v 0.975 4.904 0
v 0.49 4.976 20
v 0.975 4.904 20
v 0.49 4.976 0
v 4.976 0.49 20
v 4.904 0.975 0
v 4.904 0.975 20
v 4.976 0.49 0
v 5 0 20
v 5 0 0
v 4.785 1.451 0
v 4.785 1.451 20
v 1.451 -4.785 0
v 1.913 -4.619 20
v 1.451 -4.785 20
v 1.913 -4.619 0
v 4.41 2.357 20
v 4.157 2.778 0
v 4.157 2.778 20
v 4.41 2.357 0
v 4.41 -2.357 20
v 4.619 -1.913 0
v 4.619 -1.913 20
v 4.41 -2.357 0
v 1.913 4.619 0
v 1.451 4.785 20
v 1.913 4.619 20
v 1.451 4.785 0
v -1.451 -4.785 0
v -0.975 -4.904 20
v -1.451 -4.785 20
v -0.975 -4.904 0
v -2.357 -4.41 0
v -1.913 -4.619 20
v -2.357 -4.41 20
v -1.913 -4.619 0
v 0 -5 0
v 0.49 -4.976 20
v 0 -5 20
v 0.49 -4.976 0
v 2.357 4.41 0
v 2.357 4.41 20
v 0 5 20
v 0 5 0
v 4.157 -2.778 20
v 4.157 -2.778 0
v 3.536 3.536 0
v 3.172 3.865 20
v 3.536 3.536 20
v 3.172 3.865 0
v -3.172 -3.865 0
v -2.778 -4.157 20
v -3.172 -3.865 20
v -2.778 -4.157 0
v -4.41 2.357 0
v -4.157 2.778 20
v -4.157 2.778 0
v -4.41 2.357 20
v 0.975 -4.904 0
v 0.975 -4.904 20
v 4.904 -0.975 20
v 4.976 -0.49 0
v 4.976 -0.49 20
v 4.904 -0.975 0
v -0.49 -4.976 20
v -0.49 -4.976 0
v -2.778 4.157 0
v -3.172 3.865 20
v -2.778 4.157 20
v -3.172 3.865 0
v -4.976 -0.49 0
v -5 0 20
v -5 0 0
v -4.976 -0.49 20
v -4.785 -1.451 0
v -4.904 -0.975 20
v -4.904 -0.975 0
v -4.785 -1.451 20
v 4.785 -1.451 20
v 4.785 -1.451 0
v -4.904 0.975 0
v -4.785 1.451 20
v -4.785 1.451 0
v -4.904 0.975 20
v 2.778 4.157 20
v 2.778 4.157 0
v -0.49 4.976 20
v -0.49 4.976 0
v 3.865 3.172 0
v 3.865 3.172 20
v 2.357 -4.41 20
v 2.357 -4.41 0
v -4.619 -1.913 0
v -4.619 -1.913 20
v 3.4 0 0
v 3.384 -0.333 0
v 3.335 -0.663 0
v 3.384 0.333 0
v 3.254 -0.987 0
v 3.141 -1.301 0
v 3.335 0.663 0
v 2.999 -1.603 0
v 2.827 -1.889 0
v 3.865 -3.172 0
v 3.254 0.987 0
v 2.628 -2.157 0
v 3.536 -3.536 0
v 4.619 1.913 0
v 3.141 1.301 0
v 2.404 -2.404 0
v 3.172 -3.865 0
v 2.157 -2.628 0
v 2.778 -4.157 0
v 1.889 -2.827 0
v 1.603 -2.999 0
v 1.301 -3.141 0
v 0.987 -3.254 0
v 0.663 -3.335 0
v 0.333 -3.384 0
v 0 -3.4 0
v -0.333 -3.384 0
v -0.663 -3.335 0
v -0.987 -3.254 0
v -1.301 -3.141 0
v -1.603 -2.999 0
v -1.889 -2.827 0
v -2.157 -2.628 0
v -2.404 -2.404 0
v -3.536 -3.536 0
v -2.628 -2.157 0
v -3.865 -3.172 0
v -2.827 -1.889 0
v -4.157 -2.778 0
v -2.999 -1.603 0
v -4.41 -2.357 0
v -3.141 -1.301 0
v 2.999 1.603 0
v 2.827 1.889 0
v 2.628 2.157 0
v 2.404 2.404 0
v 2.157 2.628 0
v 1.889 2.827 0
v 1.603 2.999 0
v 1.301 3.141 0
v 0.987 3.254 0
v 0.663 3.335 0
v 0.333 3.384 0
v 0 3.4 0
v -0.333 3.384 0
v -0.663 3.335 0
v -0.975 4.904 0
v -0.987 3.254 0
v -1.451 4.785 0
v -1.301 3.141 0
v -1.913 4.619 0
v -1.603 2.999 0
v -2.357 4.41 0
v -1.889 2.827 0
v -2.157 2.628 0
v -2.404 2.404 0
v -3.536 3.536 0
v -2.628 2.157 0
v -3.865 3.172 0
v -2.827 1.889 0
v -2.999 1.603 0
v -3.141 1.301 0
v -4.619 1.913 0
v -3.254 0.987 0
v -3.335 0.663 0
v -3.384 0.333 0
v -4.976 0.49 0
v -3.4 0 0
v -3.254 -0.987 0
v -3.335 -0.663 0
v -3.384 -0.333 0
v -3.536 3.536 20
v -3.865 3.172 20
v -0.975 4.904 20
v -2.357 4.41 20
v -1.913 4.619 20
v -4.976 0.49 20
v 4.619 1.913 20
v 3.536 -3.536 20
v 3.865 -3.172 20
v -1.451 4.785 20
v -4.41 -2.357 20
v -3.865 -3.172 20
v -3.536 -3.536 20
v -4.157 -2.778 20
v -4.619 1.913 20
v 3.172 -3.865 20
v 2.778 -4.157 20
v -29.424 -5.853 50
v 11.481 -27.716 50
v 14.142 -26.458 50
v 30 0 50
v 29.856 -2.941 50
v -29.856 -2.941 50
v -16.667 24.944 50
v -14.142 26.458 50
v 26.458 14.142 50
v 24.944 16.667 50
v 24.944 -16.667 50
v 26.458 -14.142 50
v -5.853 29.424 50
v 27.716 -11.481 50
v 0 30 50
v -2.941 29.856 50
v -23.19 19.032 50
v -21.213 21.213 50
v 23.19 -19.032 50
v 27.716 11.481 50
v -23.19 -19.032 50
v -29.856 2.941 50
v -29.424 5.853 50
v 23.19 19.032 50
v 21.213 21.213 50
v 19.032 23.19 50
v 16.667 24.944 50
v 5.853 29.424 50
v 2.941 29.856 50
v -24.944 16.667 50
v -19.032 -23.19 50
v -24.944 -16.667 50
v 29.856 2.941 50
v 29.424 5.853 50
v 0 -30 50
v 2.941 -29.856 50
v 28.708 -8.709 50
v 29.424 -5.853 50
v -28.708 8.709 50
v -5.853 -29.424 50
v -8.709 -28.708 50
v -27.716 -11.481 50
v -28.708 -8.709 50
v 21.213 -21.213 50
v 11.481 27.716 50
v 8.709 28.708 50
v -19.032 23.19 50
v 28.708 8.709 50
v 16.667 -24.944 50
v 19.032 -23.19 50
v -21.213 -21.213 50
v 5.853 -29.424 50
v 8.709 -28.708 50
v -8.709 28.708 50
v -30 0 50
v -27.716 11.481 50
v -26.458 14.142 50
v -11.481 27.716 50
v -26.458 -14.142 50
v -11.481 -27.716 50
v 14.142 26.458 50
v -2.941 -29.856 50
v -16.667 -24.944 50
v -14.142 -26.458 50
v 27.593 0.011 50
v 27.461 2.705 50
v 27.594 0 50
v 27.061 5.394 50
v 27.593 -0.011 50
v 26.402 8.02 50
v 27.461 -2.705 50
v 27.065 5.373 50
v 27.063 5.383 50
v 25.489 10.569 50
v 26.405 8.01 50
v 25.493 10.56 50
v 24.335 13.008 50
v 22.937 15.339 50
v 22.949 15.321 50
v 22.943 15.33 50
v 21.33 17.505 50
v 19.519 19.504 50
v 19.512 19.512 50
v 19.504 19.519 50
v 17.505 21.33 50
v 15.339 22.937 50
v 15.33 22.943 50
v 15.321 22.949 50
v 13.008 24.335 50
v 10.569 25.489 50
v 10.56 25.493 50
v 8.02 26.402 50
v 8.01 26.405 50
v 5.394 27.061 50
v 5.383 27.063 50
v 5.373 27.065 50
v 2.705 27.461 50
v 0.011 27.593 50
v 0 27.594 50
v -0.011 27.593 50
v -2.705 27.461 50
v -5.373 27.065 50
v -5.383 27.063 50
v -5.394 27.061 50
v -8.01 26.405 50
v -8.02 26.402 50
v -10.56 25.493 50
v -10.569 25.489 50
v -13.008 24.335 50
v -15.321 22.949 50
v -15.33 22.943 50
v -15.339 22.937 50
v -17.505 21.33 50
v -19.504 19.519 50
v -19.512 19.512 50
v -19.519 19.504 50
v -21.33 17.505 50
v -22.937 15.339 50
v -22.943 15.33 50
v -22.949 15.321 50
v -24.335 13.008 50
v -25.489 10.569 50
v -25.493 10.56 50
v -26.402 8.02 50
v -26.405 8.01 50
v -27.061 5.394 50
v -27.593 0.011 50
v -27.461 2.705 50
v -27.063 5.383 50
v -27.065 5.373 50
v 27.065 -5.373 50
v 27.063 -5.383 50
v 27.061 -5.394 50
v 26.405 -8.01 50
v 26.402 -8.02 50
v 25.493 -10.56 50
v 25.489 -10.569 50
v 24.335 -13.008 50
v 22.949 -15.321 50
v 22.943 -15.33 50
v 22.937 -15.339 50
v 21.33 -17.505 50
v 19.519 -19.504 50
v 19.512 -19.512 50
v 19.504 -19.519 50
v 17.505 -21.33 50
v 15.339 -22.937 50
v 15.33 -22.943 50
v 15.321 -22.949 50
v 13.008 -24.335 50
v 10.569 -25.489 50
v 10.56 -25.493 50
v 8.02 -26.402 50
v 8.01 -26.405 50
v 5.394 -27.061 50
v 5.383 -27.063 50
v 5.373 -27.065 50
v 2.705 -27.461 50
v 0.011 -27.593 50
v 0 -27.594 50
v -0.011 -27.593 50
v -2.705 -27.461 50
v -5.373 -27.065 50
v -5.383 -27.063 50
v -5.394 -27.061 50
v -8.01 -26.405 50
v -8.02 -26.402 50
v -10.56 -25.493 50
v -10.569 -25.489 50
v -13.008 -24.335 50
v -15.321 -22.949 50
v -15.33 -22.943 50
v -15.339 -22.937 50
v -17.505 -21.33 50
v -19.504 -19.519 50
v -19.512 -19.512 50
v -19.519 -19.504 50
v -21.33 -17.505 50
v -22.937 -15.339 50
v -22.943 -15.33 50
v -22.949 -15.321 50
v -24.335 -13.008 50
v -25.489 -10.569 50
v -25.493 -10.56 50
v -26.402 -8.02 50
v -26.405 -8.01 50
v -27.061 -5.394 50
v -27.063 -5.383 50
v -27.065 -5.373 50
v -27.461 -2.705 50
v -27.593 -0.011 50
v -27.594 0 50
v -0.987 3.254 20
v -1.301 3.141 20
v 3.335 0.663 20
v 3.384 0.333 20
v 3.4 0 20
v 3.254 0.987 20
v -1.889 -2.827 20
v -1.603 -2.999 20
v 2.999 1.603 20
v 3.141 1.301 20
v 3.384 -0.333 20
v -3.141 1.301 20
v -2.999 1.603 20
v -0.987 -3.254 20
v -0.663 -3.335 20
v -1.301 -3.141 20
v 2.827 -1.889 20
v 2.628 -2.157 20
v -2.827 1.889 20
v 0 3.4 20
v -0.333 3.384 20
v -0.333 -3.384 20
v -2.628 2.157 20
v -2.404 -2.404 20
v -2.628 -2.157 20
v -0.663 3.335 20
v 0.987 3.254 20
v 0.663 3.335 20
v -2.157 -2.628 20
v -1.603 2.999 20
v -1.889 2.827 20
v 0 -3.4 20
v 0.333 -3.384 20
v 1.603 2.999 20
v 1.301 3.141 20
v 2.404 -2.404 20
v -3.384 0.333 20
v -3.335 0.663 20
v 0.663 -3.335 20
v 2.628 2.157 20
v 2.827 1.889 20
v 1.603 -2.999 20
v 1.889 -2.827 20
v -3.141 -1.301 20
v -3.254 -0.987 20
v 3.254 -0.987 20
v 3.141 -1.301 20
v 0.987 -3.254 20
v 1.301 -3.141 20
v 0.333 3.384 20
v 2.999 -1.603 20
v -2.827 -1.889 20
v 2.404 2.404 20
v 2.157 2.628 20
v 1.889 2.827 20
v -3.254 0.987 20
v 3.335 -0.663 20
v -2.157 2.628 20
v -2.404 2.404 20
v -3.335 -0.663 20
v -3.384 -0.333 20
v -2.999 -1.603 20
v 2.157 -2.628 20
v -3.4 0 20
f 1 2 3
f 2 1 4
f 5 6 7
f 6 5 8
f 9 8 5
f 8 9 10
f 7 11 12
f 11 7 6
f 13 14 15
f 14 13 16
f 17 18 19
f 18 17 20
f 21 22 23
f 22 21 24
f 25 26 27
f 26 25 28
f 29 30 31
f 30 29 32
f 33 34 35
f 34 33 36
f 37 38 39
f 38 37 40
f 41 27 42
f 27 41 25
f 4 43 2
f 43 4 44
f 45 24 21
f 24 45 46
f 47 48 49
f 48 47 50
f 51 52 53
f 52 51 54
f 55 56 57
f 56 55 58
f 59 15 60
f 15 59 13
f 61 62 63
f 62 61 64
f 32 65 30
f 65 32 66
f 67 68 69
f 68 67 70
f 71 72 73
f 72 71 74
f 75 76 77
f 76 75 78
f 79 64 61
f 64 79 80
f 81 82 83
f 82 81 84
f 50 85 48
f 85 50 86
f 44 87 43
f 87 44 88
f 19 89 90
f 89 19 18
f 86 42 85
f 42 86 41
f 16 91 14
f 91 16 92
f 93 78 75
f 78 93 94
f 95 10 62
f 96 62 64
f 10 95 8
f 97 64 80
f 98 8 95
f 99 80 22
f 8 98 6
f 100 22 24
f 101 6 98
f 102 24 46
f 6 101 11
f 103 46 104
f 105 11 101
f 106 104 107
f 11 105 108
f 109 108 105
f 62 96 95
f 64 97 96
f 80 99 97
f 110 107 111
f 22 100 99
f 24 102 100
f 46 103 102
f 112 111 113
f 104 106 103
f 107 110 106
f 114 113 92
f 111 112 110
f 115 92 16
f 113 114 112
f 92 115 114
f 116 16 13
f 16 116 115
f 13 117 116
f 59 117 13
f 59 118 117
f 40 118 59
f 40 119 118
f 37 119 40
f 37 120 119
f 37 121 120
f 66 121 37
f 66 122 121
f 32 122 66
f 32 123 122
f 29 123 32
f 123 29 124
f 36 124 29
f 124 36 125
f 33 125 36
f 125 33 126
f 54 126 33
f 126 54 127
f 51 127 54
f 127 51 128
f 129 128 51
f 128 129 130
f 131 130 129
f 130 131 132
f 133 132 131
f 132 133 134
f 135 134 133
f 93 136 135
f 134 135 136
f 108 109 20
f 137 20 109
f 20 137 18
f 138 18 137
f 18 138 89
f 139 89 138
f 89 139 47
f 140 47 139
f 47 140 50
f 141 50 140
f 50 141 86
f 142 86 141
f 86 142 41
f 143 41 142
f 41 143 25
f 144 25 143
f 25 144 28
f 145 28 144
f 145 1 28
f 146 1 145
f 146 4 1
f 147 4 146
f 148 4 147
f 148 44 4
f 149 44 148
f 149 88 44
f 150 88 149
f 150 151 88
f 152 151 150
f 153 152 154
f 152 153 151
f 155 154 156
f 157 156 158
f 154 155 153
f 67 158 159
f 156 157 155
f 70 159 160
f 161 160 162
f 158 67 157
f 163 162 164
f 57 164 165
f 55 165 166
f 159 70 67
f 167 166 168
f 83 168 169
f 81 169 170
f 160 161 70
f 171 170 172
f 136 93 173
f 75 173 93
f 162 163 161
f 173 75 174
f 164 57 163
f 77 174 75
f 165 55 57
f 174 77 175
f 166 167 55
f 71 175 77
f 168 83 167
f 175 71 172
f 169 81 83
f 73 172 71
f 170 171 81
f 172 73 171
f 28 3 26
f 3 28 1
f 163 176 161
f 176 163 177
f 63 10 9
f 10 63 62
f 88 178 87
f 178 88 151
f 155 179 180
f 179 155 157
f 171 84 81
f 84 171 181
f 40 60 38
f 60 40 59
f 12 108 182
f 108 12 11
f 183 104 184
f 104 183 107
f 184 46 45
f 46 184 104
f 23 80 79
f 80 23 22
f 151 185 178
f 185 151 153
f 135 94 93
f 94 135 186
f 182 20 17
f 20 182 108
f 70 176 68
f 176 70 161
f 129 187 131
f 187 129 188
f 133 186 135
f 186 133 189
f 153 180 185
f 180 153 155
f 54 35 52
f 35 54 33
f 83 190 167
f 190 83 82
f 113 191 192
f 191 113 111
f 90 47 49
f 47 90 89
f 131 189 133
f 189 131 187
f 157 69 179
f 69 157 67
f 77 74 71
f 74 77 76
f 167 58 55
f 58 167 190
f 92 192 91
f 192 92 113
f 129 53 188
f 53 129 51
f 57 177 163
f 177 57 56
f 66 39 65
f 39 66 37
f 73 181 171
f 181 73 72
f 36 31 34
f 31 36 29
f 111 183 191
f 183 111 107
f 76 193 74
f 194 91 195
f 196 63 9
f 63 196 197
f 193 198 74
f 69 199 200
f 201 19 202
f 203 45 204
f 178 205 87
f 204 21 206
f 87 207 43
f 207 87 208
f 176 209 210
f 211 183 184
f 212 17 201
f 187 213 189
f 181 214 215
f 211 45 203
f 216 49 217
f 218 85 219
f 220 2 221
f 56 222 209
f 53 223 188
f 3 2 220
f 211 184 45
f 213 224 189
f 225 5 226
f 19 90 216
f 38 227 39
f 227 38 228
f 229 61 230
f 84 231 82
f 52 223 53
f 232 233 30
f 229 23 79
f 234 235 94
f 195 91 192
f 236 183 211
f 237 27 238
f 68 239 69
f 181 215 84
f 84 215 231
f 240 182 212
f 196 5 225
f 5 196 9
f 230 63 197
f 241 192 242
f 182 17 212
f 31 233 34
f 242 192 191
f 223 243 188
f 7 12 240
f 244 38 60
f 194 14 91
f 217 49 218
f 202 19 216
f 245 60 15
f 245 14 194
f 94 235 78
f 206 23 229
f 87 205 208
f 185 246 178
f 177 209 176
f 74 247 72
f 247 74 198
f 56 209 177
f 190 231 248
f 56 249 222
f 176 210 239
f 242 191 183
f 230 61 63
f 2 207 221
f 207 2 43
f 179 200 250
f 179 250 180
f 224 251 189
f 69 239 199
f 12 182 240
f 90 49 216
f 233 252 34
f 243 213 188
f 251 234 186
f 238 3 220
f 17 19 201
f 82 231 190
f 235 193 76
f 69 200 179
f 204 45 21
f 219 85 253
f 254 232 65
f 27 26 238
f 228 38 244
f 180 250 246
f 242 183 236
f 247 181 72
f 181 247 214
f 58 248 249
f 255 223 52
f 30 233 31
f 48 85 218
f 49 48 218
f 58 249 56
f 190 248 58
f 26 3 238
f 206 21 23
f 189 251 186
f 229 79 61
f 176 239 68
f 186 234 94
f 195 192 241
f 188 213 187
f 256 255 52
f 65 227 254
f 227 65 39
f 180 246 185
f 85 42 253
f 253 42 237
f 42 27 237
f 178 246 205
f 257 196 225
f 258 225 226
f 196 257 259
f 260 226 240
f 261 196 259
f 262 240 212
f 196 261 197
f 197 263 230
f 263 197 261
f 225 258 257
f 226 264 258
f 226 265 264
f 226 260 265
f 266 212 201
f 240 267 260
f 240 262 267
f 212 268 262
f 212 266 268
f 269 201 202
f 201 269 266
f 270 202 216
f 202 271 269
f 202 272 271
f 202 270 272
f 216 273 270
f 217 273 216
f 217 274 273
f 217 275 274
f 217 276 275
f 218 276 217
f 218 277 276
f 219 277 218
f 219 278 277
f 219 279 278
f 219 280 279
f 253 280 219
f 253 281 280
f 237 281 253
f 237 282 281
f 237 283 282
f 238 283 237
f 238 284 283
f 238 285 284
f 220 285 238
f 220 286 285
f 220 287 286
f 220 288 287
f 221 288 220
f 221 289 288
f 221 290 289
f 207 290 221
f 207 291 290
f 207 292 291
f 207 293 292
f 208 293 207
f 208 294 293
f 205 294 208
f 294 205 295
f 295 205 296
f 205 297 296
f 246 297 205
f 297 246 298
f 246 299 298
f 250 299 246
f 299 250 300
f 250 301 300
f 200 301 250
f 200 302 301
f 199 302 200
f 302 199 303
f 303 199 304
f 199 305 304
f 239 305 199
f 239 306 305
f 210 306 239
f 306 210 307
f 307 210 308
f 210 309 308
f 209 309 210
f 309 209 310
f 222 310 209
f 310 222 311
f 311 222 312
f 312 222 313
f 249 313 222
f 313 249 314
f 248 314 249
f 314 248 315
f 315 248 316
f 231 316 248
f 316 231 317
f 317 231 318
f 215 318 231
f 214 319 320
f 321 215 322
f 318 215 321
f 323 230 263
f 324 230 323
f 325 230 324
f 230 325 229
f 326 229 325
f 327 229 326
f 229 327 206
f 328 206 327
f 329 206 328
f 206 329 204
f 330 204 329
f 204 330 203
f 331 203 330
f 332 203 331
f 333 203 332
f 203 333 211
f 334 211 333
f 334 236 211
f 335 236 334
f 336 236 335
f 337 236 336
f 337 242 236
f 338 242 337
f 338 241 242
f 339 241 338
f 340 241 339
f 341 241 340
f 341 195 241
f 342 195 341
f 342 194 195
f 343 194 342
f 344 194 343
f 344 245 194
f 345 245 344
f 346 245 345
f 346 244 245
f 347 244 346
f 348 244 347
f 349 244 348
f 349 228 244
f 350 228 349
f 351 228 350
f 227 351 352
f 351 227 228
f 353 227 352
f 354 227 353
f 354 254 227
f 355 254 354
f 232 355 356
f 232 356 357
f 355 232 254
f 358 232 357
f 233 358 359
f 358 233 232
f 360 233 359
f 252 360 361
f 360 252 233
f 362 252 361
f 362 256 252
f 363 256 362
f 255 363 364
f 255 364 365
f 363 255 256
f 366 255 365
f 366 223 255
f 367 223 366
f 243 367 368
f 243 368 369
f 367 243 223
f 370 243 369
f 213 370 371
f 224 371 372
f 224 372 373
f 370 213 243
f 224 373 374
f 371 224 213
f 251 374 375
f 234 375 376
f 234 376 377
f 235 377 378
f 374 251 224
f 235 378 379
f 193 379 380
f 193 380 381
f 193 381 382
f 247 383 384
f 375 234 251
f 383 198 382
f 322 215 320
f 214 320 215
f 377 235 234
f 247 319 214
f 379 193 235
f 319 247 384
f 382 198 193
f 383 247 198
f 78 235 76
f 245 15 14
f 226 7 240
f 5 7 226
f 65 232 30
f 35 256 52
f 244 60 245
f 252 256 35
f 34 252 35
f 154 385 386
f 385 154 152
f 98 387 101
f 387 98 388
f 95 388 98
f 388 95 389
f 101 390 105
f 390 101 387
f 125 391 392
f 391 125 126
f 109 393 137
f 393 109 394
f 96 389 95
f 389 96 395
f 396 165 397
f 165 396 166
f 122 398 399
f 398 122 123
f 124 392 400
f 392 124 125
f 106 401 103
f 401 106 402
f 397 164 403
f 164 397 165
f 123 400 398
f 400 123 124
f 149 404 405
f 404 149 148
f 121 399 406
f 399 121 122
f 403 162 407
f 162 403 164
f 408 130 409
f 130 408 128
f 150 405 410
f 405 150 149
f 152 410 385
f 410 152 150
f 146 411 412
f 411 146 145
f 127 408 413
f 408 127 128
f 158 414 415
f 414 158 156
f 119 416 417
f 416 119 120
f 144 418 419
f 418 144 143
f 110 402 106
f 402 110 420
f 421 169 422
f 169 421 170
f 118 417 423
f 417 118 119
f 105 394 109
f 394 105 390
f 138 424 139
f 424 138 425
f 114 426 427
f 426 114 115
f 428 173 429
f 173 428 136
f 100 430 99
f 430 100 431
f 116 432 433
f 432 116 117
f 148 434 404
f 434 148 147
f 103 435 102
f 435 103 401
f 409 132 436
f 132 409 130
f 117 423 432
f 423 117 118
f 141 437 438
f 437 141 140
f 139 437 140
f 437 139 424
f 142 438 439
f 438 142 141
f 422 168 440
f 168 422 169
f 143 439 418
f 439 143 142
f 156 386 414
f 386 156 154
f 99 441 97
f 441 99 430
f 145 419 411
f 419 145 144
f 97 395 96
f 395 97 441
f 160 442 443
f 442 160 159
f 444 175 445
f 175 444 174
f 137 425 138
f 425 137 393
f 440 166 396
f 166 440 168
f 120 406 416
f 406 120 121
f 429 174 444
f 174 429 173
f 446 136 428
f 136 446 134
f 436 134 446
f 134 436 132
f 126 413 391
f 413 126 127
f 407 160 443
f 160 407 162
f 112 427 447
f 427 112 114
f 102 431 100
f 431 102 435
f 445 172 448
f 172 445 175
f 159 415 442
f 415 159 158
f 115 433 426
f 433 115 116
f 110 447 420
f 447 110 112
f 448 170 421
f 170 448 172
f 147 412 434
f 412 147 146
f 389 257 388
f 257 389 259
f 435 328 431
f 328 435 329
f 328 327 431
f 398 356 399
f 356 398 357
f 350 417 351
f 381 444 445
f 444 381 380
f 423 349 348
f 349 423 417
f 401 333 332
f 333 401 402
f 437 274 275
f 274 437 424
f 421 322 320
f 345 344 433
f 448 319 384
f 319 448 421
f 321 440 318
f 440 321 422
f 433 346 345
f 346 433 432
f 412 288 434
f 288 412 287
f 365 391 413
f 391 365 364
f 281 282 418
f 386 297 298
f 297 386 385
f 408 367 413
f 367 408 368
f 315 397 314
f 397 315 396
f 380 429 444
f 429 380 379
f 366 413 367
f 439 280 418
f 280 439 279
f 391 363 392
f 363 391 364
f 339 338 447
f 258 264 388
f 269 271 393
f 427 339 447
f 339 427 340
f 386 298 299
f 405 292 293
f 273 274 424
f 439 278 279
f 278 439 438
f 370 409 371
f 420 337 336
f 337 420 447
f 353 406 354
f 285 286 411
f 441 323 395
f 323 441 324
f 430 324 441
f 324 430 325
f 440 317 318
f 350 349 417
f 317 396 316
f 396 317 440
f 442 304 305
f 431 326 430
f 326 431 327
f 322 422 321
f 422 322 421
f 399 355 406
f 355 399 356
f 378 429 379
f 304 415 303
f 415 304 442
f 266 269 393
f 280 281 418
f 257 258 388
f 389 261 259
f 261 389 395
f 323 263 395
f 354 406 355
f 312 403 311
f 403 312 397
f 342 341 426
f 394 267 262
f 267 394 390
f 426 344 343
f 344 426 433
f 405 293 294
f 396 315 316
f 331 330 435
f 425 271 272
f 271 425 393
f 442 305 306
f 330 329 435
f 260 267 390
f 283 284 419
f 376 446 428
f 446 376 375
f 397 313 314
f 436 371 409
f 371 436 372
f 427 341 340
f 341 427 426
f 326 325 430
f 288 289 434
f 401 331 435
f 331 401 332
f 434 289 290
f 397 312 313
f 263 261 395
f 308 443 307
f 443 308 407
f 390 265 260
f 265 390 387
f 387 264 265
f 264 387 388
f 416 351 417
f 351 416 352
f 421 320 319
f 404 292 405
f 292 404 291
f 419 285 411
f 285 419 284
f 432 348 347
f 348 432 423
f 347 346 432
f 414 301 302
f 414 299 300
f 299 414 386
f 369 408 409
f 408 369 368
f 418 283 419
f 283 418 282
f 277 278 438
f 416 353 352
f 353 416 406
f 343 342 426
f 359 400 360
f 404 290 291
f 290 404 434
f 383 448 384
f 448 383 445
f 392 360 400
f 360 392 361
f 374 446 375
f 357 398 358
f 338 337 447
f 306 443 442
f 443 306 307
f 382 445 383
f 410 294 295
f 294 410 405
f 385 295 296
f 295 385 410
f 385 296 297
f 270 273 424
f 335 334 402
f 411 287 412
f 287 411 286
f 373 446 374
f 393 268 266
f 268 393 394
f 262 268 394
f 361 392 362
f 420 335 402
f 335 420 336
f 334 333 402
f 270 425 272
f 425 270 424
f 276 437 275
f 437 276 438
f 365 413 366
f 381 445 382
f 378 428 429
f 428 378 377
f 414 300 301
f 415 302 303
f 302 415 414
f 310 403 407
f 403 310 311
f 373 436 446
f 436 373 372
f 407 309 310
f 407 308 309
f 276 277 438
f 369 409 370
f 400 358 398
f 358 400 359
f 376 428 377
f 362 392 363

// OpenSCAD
// --- Dimensions (mm) ---
spout_od = 10.0;          // Outer diameter of the spout
spout_height = 20.0;      // Height of the spout from the base
funnel_rim_od = 60.0;     // Outer diameter at the top rim
funnel_height = 50.0;     // Total height from base to top rim
wall_thickness = 1.6;     // Constant wall thickness
$fn = 64;                 // Smoothness for curves

// --- Derived Dimensions ---
// The specification requires a constant wall thickness of 1.6mm.
// This means the inner diameter (ID) must be: OD - (2 * wall_thickness).
spout_id = spout_od - (2 * wall_thickness);
funnel_id_top = funnel_rim_od - (2 * wall_thickness);

// --- Modeling ---

// The part is printed upright, resting on the XY plane at z = 0.
// We use a difference() to subtract the hollow interior from the solid shell.

difference() {
    // 1. The Outer Shell (The Solid Body)
    union() {
        // Spout Cylinder (z = 0 to z = 20)
        cylinder(h = spout_height, d = spout_od);
        
        // Funnel Cone (z = 20 to z = 50)
        // d1 is the diameter at the bottom of the cone (z=20)
        // d2 is the diameter at the top of the cone (z=50)
        translate([0, 0, spout_height])
        cylinder(h = funnel_height - spout_height, d1 = spout_od, d2 = funnel_rim_od);
    }

    // 2. The Inner Void (The Hole)
    // To ensure the part is open at the top and bottom, the subtraction 
    // shapes must extend slightly beyond the boundaries of the solid.
    union() {
        // Spout Hole: Starts at z = -1 and goes to z = spout_height + 1
        // This ensures the bottom (z=0) is completely cut through.
        translate([0, 0, -1])
        cylinder(h = spout_height + 2, d = spout_id);
        
        // Funnel Hole: Starts at z = spout_height and goes to z = funnel_height + 1
        // This ensures the top (z=50) is completely cut through.
        // The diameter at the bottom of this hole (z=20) must match the spout_id
        // to maintain the constant 1.6mm wall thickness.
        translate([0, 0, spout_height])
        cylinder(h = (funnel_height - spout_height) + 1, d1 = spout_id, d2 = funnel_id_top);
    }
}

/* 
  Verification of Specifications:
  - Spout OD: 10.0mm.
  - Spout ID: 10.0 - (2 * 1.6) = 6.8mm.
  - Funnel Rim OD: 60.0mm.
  - Funnel Rim ID: 60.0 - (2 * 1.6) = 56.8mm.
  - Wall Thickness: 
    At spout: (10 - 6.8)/2 = 1.6mm.
    At rim: (60 - 56.8)/2 = 1.6mm.
  - Openings: The difference() with extended heights ensures the top and bottom are open.
*/
